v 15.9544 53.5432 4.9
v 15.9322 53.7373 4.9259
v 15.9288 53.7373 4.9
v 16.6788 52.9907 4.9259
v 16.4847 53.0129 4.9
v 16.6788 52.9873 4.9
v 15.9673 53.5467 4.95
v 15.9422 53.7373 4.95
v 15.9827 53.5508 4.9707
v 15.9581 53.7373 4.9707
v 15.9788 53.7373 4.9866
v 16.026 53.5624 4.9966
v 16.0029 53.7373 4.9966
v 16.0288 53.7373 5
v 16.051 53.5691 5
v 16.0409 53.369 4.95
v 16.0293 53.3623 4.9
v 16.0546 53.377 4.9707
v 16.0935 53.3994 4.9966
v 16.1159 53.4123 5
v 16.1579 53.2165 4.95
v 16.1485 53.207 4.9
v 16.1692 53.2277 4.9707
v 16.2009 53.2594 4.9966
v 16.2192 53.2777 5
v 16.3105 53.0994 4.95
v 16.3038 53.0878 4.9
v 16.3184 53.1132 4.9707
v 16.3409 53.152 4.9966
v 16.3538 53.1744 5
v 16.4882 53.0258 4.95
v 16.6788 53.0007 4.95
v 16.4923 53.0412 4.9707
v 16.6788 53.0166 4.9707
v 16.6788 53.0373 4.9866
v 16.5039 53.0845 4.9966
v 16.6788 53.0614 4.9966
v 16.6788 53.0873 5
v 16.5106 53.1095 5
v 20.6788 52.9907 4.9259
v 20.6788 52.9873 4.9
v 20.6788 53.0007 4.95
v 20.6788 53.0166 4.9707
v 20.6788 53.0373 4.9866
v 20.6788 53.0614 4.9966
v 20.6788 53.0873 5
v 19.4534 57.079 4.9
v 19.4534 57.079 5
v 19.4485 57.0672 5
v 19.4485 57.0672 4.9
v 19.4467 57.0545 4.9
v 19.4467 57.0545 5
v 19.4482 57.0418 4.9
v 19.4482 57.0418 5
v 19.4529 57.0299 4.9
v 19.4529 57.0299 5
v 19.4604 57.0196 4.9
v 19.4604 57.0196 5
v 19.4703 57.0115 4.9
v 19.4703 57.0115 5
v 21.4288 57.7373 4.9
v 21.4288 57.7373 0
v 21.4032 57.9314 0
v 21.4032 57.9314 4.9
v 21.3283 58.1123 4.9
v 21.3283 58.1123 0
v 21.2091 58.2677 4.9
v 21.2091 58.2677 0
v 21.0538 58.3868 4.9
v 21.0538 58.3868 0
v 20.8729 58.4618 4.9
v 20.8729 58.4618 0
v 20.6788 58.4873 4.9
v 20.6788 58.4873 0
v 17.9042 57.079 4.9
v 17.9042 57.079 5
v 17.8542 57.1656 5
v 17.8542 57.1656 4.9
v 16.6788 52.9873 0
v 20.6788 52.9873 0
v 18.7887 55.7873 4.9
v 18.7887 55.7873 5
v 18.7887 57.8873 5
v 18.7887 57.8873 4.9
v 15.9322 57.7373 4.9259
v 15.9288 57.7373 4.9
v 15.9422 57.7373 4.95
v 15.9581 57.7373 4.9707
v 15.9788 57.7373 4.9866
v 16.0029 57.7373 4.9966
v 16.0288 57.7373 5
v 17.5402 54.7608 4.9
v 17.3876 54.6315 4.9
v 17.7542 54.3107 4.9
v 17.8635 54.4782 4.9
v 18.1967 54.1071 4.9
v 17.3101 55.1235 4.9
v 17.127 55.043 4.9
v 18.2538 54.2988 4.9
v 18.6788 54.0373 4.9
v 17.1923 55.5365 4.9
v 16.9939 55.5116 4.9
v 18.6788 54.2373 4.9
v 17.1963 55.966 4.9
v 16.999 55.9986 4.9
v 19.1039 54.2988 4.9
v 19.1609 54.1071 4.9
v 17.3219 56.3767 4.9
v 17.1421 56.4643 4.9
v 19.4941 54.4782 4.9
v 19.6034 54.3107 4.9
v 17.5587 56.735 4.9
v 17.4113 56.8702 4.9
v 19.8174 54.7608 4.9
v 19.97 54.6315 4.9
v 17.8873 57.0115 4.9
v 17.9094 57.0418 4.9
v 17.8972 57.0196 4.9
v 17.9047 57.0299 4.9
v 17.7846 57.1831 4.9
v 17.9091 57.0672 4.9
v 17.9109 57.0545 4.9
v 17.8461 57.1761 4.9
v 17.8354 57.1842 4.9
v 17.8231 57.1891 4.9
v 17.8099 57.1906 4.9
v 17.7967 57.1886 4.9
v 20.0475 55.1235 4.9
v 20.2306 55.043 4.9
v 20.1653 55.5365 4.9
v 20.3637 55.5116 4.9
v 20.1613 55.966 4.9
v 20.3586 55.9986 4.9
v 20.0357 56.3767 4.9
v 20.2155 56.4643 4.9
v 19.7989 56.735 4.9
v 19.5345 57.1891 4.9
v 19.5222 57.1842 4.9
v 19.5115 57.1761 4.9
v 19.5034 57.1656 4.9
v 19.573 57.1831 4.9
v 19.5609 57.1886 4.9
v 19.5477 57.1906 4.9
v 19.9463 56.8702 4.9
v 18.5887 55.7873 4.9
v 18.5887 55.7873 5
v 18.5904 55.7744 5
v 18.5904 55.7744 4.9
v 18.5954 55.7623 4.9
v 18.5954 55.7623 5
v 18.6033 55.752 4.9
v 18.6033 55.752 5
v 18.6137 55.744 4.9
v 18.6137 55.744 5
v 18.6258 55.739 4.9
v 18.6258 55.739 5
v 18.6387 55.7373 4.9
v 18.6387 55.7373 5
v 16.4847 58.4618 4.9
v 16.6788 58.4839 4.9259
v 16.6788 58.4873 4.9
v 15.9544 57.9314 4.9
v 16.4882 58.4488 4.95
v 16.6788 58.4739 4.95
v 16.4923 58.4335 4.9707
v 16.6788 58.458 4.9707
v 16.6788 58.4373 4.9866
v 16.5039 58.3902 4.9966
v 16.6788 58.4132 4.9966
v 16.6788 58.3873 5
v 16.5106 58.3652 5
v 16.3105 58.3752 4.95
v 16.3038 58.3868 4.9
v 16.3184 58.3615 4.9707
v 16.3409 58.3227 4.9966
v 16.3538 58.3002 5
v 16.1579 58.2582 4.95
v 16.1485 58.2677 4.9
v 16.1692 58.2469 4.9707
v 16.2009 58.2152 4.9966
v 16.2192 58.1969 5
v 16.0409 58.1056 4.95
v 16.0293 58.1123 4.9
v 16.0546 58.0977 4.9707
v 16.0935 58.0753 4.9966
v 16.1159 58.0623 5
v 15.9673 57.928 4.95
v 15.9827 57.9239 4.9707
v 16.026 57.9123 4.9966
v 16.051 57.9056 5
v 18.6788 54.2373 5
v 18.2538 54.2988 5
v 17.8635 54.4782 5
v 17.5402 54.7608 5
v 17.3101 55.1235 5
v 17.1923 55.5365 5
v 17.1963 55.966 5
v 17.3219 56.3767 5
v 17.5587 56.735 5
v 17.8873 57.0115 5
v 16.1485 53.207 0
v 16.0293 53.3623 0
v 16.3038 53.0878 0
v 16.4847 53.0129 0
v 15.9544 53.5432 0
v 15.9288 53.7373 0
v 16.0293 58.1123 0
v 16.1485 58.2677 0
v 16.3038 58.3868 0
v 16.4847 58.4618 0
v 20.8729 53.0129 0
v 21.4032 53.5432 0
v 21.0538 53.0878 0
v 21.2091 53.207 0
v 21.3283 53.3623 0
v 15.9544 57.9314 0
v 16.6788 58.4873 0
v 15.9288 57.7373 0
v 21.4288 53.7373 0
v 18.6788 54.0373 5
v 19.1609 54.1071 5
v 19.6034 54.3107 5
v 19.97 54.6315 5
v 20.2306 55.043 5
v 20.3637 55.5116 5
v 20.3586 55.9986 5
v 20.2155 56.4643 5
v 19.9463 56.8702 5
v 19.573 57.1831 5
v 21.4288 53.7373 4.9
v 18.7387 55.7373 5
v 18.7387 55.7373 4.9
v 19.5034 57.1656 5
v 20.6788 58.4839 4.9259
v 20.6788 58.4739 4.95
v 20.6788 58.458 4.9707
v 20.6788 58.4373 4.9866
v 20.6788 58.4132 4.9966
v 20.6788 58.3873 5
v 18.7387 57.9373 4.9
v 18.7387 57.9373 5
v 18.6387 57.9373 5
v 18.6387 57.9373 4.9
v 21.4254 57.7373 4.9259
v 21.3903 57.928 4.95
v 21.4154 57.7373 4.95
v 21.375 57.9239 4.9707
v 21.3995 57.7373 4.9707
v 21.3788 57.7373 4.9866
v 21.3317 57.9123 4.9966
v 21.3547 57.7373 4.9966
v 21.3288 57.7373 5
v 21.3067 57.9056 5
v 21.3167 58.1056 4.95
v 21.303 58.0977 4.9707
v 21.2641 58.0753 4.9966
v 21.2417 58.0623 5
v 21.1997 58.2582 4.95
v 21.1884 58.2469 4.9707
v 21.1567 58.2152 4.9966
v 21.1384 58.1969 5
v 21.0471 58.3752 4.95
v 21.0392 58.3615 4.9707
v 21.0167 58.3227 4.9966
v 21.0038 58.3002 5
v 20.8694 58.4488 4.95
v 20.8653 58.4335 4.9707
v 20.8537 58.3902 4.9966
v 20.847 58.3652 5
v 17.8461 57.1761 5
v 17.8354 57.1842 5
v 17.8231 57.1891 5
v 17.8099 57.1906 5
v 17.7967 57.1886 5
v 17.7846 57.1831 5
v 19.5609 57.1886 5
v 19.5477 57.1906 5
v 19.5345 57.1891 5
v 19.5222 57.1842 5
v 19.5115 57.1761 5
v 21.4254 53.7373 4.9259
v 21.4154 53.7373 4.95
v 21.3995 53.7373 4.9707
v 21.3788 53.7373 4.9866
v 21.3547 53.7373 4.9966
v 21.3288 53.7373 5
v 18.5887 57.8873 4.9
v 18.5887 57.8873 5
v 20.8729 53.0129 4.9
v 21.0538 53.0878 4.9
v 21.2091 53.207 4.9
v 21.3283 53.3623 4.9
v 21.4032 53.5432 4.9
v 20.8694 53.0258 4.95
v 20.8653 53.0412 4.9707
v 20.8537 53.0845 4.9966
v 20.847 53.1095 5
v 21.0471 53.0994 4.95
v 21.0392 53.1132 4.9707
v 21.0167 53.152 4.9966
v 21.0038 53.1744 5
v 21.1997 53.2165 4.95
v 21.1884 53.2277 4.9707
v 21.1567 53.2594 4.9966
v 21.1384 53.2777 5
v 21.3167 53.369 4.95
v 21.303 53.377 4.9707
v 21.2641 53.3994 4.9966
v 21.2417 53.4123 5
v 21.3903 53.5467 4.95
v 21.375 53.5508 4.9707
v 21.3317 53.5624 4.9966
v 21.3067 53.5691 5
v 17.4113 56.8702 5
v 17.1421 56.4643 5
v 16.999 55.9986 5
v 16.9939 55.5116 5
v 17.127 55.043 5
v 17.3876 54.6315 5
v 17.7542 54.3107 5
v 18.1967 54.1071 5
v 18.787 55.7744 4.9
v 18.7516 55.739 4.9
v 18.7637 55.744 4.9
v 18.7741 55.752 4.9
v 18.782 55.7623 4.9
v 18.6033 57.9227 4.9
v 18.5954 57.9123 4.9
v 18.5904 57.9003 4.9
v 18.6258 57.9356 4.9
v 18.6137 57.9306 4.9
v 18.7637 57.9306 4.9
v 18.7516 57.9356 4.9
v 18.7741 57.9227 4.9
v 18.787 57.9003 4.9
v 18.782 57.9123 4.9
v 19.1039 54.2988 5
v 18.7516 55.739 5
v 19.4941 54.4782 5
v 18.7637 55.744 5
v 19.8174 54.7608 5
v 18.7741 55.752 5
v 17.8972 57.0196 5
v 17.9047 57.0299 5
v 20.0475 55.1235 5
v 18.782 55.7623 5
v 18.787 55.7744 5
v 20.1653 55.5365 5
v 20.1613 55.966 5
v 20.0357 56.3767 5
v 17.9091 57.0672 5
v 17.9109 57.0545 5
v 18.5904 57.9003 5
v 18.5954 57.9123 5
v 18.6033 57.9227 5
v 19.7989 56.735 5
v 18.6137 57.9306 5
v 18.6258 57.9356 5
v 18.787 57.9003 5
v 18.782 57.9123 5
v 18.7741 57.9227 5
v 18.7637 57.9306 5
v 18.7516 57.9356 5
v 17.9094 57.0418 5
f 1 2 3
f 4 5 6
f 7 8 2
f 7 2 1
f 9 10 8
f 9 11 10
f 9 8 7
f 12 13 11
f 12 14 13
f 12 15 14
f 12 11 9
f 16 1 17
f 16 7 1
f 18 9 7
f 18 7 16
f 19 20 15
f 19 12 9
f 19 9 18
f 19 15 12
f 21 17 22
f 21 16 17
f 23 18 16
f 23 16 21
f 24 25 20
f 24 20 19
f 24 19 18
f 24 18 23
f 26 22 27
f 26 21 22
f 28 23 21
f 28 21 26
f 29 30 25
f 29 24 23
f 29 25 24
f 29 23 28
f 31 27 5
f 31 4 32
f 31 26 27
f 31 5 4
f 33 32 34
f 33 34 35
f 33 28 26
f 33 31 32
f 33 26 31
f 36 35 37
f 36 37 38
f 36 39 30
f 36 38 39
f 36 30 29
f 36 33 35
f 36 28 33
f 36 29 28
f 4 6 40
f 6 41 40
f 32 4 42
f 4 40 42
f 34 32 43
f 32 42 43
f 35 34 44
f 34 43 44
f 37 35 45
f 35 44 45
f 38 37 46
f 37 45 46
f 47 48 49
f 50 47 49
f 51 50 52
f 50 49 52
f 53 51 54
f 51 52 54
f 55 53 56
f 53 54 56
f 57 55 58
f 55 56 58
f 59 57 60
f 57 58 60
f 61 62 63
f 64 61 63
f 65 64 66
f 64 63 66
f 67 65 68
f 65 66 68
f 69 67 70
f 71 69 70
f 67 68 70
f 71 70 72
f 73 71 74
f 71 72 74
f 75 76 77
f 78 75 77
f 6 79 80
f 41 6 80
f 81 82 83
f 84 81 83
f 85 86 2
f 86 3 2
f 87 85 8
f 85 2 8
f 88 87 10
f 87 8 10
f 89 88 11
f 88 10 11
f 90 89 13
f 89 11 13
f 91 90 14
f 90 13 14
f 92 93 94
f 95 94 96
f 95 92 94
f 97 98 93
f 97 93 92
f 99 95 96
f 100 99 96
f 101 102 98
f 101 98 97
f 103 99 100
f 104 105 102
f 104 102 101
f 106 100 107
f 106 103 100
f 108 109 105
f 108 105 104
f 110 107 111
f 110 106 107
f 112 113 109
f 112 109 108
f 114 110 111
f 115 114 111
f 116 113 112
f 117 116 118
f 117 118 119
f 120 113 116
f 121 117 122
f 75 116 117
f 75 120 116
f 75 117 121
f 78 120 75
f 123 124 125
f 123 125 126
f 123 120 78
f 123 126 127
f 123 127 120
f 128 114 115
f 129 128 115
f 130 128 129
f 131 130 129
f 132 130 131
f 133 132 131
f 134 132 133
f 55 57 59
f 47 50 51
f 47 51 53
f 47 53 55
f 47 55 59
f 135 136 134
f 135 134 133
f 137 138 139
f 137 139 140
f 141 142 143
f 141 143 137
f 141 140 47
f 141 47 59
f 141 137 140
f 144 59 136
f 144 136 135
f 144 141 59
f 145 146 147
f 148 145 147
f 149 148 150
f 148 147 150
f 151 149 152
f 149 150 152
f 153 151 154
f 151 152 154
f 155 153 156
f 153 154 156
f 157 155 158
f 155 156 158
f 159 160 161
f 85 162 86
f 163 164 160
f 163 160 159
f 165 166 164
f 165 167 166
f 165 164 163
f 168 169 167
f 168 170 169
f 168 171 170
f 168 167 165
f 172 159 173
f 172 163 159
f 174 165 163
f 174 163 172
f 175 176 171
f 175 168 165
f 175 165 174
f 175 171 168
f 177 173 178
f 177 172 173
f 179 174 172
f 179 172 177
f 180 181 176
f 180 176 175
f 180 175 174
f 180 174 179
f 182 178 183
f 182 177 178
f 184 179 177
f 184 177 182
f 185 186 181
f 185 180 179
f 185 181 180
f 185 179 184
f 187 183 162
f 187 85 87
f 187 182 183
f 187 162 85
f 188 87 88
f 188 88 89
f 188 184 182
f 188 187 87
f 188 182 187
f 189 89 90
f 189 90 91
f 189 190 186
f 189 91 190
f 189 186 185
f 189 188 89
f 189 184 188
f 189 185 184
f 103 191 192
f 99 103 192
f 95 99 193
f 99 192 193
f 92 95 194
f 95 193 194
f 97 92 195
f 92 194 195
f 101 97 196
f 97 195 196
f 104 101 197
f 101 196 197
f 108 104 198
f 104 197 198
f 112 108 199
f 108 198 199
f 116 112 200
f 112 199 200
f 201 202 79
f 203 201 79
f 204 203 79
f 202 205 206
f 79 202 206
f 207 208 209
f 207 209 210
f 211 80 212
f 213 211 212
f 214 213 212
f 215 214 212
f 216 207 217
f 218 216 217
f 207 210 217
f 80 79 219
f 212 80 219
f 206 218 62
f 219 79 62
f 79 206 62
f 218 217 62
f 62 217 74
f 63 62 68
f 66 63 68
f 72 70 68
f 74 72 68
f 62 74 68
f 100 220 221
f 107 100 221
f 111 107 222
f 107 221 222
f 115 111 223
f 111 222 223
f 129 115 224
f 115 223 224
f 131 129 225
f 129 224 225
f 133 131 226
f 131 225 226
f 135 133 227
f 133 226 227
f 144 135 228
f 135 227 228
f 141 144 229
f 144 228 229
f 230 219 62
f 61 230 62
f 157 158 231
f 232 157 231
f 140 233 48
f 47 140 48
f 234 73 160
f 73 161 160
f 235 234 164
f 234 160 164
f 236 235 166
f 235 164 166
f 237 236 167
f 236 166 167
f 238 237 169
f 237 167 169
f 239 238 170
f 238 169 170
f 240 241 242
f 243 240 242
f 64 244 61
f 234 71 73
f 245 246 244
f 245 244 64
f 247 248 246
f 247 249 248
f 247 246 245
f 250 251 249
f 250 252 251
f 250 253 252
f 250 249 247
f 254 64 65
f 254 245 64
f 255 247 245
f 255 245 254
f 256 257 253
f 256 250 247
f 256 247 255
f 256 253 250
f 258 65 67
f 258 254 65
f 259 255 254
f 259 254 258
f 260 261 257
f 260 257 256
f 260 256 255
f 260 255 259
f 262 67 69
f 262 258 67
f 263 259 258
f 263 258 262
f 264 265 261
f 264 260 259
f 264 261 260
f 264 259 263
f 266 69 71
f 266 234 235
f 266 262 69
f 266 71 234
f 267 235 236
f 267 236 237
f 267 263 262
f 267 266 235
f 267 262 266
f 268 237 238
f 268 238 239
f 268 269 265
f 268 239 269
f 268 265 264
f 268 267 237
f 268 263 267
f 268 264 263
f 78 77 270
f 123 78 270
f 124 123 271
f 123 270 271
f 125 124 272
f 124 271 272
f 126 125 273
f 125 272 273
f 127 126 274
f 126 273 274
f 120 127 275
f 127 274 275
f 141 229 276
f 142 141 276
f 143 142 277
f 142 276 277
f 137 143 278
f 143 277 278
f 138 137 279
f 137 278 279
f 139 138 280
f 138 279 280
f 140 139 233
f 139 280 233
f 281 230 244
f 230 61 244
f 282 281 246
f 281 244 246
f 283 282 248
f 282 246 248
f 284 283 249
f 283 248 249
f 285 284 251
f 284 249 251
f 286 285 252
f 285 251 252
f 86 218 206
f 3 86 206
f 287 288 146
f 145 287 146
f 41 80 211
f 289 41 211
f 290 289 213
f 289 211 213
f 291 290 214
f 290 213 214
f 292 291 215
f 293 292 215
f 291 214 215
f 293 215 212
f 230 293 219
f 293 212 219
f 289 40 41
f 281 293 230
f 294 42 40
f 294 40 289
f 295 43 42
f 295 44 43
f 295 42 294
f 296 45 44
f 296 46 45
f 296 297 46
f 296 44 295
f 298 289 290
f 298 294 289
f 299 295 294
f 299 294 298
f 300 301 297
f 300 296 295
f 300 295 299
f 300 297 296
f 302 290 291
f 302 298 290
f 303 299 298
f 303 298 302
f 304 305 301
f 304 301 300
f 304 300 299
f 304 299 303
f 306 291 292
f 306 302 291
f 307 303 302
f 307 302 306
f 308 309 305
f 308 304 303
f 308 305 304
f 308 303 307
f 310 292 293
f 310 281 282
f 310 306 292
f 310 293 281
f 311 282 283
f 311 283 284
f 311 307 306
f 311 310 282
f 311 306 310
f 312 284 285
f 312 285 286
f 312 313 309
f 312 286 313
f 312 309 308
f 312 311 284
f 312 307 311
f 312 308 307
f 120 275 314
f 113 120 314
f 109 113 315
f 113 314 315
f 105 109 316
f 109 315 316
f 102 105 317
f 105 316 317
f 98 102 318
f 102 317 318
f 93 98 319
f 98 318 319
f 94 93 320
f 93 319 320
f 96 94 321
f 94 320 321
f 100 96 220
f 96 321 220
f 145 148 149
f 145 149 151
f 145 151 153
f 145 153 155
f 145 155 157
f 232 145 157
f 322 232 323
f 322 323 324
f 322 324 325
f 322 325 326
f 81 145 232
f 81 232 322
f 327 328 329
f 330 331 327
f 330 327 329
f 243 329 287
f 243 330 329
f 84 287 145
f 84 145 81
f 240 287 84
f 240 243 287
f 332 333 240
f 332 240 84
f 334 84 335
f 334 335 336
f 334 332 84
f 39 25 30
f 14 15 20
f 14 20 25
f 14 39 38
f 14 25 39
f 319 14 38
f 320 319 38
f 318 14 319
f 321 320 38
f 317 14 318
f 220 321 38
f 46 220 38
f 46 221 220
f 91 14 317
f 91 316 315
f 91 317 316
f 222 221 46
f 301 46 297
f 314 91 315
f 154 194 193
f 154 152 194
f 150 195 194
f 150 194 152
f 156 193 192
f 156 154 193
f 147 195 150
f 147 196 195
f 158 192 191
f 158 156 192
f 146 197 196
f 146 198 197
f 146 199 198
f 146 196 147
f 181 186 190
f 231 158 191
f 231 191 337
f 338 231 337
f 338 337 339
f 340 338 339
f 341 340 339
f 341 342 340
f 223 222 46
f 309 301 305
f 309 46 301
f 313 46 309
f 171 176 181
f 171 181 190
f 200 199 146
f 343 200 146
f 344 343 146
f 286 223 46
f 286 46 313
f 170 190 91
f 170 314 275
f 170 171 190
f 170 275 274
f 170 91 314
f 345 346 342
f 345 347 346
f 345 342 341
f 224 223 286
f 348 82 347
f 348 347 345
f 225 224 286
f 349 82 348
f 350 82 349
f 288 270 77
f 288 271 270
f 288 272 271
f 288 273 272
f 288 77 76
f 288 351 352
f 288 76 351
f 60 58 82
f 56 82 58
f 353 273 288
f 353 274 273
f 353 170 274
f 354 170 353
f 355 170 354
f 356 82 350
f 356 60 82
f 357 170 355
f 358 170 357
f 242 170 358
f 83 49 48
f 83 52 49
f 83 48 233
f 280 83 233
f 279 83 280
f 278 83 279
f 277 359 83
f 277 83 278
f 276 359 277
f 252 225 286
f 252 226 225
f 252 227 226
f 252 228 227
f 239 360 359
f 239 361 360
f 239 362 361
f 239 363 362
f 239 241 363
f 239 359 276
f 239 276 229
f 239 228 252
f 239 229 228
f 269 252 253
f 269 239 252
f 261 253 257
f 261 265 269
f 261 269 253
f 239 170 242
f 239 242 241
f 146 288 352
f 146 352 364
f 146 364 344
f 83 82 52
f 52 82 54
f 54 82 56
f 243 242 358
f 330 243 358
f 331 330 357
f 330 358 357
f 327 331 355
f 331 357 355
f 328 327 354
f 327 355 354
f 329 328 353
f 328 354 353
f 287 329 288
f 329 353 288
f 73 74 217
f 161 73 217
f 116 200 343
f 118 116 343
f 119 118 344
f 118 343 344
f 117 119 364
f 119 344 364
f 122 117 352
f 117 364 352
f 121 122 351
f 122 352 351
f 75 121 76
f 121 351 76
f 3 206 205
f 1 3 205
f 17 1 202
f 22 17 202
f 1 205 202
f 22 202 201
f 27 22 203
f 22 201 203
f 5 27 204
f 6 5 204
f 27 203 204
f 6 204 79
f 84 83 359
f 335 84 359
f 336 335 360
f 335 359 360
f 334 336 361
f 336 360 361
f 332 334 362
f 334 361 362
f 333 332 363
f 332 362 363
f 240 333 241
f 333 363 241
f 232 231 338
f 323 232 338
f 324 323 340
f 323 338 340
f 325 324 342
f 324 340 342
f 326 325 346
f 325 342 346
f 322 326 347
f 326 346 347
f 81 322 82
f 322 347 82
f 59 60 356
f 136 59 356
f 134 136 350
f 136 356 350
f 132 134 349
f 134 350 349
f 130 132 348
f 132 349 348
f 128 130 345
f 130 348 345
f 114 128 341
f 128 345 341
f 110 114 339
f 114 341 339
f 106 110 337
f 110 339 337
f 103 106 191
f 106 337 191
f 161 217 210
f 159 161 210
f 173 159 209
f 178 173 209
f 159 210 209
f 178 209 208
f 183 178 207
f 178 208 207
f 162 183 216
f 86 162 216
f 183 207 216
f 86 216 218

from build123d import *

# Parameters (mm, degrees)
F1_DEPTH = 5
F3_DEPTH = 0.1
F4_R     = 0.1


with BuildPart() as f1:
    # F0 (on Top) → F1 (new body)
    with BuildSketch(Plane.XY):
        with BuildLine():
            Line((20.678803, 58.487322), (16.678803, 58.487322))
            ThreePointArc((16.678803, 58.487322), (16.148473, 58.267652), (15.928803, 57.737322))
            Line((15.928803, 57.737322), (15.928803, 53.737322))
            ThreePointArc((15.928803, 53.737322), (16.148473, 53.206992), (16.678803, 52.987322))
            Line((16.678803, 52.987322), (20.678803, 52.987322))
            ThreePointArc((20.678803, 52.987322), (21.209133, 53.206992), (21.428803, 53.737322))
            Line((21.428803, 53.737322), (21.428803, 57.737322))
            ThreePointArc((21.428803, 57.737322), (21.209133, 58.267652), (20.678803, 58.487322))
        make_face()
    extrude(amount=F1_DEPTH)

    # F2 (on face) → F3 (cut)
    with BuildSketch(Plane.XY.offset(5)):
        with BuildLine():
            ThreePointArc((19.4534, 57.078963), (19.448202, 57.041803), (19.470317, 57.011491))
            ThreePointArc((19.470317, 57.011491), (20.121241, 55.325772), (18.678803, 54.237322))
            ThreePointArc((18.678803, 54.237322), (17.236365, 55.325772), (17.887289, 57.011491))
            ThreePointArc((17.887289, 57.011491), (17.909404, 57.041803), (17.904206, 57.078963))
            Line((17.904206, 57.078963), (17.854182, 57.165608))
            ThreePointArc((17.854182, 57.165608), (17.823088, 57.189095), (17.78458, 57.183132))
            ThreePointArc((17.78458, 57.183132), (17.043585, 55.272498), (18.678803, 54.037322))
            ThreePointArc((18.678803, 54.037322), (20.314021, 55.272498), (19.573026, 57.183132))
            ThreePointArc((19.573026, 57.183132), (19.534518, 57.189095), (19.503424, 57.165608))
            Line((19.503424, 57.165608), (19.4534, 57.078963))
        make_face()
        with BuildLine():
            ThreePointArc((18.588702, 55.787322), (18.603347, 55.751967), (18.638702, 55.737322))
            Line((18.638702, 55.737322), (18.738702, 55.737322))
            ThreePointArc((18.738702, 55.737322), (18.774057, 55.751967), (18.788702, 55.787322))
            Line((18.788702, 55.787322), (18.788702, 57.887322))
            ThreePointArc((18.788702, 57.887322), (18.774057, 57.922678), (18.738702, 57.937322))
            Line((18.738702, 57.937322), (18.638702, 57.937322))
            ThreePointArc((18.638702, 57.937322), (18.603347, 57.922678), (18.588702, 57.887322))
            Line((18.588702, 57.887322), (18.588702, 55.787322))
        make_face()
    extrude(amount=-F3_DEPTH, mode=Mode.SUBTRACT)

    # F4
    f4_edges = [f1.edges().sort_by_distance(p)[0] for p in [
        (18.678803, 58.487322, 5),
        (16.148473, 58.267652, 5),
        (15.928803, 55.737322, 5),
        (16.148473, 53.206992, 5),
        (21.209133, 53.206992, 5),
        (18.678803, 52.987322, 5),
        (21.428803, 55.737322, 5),
        (21.209133, 58.267652, 5),
    ]]
    fillet(f4_edges, radius=F4_R)


solid = f1.part
